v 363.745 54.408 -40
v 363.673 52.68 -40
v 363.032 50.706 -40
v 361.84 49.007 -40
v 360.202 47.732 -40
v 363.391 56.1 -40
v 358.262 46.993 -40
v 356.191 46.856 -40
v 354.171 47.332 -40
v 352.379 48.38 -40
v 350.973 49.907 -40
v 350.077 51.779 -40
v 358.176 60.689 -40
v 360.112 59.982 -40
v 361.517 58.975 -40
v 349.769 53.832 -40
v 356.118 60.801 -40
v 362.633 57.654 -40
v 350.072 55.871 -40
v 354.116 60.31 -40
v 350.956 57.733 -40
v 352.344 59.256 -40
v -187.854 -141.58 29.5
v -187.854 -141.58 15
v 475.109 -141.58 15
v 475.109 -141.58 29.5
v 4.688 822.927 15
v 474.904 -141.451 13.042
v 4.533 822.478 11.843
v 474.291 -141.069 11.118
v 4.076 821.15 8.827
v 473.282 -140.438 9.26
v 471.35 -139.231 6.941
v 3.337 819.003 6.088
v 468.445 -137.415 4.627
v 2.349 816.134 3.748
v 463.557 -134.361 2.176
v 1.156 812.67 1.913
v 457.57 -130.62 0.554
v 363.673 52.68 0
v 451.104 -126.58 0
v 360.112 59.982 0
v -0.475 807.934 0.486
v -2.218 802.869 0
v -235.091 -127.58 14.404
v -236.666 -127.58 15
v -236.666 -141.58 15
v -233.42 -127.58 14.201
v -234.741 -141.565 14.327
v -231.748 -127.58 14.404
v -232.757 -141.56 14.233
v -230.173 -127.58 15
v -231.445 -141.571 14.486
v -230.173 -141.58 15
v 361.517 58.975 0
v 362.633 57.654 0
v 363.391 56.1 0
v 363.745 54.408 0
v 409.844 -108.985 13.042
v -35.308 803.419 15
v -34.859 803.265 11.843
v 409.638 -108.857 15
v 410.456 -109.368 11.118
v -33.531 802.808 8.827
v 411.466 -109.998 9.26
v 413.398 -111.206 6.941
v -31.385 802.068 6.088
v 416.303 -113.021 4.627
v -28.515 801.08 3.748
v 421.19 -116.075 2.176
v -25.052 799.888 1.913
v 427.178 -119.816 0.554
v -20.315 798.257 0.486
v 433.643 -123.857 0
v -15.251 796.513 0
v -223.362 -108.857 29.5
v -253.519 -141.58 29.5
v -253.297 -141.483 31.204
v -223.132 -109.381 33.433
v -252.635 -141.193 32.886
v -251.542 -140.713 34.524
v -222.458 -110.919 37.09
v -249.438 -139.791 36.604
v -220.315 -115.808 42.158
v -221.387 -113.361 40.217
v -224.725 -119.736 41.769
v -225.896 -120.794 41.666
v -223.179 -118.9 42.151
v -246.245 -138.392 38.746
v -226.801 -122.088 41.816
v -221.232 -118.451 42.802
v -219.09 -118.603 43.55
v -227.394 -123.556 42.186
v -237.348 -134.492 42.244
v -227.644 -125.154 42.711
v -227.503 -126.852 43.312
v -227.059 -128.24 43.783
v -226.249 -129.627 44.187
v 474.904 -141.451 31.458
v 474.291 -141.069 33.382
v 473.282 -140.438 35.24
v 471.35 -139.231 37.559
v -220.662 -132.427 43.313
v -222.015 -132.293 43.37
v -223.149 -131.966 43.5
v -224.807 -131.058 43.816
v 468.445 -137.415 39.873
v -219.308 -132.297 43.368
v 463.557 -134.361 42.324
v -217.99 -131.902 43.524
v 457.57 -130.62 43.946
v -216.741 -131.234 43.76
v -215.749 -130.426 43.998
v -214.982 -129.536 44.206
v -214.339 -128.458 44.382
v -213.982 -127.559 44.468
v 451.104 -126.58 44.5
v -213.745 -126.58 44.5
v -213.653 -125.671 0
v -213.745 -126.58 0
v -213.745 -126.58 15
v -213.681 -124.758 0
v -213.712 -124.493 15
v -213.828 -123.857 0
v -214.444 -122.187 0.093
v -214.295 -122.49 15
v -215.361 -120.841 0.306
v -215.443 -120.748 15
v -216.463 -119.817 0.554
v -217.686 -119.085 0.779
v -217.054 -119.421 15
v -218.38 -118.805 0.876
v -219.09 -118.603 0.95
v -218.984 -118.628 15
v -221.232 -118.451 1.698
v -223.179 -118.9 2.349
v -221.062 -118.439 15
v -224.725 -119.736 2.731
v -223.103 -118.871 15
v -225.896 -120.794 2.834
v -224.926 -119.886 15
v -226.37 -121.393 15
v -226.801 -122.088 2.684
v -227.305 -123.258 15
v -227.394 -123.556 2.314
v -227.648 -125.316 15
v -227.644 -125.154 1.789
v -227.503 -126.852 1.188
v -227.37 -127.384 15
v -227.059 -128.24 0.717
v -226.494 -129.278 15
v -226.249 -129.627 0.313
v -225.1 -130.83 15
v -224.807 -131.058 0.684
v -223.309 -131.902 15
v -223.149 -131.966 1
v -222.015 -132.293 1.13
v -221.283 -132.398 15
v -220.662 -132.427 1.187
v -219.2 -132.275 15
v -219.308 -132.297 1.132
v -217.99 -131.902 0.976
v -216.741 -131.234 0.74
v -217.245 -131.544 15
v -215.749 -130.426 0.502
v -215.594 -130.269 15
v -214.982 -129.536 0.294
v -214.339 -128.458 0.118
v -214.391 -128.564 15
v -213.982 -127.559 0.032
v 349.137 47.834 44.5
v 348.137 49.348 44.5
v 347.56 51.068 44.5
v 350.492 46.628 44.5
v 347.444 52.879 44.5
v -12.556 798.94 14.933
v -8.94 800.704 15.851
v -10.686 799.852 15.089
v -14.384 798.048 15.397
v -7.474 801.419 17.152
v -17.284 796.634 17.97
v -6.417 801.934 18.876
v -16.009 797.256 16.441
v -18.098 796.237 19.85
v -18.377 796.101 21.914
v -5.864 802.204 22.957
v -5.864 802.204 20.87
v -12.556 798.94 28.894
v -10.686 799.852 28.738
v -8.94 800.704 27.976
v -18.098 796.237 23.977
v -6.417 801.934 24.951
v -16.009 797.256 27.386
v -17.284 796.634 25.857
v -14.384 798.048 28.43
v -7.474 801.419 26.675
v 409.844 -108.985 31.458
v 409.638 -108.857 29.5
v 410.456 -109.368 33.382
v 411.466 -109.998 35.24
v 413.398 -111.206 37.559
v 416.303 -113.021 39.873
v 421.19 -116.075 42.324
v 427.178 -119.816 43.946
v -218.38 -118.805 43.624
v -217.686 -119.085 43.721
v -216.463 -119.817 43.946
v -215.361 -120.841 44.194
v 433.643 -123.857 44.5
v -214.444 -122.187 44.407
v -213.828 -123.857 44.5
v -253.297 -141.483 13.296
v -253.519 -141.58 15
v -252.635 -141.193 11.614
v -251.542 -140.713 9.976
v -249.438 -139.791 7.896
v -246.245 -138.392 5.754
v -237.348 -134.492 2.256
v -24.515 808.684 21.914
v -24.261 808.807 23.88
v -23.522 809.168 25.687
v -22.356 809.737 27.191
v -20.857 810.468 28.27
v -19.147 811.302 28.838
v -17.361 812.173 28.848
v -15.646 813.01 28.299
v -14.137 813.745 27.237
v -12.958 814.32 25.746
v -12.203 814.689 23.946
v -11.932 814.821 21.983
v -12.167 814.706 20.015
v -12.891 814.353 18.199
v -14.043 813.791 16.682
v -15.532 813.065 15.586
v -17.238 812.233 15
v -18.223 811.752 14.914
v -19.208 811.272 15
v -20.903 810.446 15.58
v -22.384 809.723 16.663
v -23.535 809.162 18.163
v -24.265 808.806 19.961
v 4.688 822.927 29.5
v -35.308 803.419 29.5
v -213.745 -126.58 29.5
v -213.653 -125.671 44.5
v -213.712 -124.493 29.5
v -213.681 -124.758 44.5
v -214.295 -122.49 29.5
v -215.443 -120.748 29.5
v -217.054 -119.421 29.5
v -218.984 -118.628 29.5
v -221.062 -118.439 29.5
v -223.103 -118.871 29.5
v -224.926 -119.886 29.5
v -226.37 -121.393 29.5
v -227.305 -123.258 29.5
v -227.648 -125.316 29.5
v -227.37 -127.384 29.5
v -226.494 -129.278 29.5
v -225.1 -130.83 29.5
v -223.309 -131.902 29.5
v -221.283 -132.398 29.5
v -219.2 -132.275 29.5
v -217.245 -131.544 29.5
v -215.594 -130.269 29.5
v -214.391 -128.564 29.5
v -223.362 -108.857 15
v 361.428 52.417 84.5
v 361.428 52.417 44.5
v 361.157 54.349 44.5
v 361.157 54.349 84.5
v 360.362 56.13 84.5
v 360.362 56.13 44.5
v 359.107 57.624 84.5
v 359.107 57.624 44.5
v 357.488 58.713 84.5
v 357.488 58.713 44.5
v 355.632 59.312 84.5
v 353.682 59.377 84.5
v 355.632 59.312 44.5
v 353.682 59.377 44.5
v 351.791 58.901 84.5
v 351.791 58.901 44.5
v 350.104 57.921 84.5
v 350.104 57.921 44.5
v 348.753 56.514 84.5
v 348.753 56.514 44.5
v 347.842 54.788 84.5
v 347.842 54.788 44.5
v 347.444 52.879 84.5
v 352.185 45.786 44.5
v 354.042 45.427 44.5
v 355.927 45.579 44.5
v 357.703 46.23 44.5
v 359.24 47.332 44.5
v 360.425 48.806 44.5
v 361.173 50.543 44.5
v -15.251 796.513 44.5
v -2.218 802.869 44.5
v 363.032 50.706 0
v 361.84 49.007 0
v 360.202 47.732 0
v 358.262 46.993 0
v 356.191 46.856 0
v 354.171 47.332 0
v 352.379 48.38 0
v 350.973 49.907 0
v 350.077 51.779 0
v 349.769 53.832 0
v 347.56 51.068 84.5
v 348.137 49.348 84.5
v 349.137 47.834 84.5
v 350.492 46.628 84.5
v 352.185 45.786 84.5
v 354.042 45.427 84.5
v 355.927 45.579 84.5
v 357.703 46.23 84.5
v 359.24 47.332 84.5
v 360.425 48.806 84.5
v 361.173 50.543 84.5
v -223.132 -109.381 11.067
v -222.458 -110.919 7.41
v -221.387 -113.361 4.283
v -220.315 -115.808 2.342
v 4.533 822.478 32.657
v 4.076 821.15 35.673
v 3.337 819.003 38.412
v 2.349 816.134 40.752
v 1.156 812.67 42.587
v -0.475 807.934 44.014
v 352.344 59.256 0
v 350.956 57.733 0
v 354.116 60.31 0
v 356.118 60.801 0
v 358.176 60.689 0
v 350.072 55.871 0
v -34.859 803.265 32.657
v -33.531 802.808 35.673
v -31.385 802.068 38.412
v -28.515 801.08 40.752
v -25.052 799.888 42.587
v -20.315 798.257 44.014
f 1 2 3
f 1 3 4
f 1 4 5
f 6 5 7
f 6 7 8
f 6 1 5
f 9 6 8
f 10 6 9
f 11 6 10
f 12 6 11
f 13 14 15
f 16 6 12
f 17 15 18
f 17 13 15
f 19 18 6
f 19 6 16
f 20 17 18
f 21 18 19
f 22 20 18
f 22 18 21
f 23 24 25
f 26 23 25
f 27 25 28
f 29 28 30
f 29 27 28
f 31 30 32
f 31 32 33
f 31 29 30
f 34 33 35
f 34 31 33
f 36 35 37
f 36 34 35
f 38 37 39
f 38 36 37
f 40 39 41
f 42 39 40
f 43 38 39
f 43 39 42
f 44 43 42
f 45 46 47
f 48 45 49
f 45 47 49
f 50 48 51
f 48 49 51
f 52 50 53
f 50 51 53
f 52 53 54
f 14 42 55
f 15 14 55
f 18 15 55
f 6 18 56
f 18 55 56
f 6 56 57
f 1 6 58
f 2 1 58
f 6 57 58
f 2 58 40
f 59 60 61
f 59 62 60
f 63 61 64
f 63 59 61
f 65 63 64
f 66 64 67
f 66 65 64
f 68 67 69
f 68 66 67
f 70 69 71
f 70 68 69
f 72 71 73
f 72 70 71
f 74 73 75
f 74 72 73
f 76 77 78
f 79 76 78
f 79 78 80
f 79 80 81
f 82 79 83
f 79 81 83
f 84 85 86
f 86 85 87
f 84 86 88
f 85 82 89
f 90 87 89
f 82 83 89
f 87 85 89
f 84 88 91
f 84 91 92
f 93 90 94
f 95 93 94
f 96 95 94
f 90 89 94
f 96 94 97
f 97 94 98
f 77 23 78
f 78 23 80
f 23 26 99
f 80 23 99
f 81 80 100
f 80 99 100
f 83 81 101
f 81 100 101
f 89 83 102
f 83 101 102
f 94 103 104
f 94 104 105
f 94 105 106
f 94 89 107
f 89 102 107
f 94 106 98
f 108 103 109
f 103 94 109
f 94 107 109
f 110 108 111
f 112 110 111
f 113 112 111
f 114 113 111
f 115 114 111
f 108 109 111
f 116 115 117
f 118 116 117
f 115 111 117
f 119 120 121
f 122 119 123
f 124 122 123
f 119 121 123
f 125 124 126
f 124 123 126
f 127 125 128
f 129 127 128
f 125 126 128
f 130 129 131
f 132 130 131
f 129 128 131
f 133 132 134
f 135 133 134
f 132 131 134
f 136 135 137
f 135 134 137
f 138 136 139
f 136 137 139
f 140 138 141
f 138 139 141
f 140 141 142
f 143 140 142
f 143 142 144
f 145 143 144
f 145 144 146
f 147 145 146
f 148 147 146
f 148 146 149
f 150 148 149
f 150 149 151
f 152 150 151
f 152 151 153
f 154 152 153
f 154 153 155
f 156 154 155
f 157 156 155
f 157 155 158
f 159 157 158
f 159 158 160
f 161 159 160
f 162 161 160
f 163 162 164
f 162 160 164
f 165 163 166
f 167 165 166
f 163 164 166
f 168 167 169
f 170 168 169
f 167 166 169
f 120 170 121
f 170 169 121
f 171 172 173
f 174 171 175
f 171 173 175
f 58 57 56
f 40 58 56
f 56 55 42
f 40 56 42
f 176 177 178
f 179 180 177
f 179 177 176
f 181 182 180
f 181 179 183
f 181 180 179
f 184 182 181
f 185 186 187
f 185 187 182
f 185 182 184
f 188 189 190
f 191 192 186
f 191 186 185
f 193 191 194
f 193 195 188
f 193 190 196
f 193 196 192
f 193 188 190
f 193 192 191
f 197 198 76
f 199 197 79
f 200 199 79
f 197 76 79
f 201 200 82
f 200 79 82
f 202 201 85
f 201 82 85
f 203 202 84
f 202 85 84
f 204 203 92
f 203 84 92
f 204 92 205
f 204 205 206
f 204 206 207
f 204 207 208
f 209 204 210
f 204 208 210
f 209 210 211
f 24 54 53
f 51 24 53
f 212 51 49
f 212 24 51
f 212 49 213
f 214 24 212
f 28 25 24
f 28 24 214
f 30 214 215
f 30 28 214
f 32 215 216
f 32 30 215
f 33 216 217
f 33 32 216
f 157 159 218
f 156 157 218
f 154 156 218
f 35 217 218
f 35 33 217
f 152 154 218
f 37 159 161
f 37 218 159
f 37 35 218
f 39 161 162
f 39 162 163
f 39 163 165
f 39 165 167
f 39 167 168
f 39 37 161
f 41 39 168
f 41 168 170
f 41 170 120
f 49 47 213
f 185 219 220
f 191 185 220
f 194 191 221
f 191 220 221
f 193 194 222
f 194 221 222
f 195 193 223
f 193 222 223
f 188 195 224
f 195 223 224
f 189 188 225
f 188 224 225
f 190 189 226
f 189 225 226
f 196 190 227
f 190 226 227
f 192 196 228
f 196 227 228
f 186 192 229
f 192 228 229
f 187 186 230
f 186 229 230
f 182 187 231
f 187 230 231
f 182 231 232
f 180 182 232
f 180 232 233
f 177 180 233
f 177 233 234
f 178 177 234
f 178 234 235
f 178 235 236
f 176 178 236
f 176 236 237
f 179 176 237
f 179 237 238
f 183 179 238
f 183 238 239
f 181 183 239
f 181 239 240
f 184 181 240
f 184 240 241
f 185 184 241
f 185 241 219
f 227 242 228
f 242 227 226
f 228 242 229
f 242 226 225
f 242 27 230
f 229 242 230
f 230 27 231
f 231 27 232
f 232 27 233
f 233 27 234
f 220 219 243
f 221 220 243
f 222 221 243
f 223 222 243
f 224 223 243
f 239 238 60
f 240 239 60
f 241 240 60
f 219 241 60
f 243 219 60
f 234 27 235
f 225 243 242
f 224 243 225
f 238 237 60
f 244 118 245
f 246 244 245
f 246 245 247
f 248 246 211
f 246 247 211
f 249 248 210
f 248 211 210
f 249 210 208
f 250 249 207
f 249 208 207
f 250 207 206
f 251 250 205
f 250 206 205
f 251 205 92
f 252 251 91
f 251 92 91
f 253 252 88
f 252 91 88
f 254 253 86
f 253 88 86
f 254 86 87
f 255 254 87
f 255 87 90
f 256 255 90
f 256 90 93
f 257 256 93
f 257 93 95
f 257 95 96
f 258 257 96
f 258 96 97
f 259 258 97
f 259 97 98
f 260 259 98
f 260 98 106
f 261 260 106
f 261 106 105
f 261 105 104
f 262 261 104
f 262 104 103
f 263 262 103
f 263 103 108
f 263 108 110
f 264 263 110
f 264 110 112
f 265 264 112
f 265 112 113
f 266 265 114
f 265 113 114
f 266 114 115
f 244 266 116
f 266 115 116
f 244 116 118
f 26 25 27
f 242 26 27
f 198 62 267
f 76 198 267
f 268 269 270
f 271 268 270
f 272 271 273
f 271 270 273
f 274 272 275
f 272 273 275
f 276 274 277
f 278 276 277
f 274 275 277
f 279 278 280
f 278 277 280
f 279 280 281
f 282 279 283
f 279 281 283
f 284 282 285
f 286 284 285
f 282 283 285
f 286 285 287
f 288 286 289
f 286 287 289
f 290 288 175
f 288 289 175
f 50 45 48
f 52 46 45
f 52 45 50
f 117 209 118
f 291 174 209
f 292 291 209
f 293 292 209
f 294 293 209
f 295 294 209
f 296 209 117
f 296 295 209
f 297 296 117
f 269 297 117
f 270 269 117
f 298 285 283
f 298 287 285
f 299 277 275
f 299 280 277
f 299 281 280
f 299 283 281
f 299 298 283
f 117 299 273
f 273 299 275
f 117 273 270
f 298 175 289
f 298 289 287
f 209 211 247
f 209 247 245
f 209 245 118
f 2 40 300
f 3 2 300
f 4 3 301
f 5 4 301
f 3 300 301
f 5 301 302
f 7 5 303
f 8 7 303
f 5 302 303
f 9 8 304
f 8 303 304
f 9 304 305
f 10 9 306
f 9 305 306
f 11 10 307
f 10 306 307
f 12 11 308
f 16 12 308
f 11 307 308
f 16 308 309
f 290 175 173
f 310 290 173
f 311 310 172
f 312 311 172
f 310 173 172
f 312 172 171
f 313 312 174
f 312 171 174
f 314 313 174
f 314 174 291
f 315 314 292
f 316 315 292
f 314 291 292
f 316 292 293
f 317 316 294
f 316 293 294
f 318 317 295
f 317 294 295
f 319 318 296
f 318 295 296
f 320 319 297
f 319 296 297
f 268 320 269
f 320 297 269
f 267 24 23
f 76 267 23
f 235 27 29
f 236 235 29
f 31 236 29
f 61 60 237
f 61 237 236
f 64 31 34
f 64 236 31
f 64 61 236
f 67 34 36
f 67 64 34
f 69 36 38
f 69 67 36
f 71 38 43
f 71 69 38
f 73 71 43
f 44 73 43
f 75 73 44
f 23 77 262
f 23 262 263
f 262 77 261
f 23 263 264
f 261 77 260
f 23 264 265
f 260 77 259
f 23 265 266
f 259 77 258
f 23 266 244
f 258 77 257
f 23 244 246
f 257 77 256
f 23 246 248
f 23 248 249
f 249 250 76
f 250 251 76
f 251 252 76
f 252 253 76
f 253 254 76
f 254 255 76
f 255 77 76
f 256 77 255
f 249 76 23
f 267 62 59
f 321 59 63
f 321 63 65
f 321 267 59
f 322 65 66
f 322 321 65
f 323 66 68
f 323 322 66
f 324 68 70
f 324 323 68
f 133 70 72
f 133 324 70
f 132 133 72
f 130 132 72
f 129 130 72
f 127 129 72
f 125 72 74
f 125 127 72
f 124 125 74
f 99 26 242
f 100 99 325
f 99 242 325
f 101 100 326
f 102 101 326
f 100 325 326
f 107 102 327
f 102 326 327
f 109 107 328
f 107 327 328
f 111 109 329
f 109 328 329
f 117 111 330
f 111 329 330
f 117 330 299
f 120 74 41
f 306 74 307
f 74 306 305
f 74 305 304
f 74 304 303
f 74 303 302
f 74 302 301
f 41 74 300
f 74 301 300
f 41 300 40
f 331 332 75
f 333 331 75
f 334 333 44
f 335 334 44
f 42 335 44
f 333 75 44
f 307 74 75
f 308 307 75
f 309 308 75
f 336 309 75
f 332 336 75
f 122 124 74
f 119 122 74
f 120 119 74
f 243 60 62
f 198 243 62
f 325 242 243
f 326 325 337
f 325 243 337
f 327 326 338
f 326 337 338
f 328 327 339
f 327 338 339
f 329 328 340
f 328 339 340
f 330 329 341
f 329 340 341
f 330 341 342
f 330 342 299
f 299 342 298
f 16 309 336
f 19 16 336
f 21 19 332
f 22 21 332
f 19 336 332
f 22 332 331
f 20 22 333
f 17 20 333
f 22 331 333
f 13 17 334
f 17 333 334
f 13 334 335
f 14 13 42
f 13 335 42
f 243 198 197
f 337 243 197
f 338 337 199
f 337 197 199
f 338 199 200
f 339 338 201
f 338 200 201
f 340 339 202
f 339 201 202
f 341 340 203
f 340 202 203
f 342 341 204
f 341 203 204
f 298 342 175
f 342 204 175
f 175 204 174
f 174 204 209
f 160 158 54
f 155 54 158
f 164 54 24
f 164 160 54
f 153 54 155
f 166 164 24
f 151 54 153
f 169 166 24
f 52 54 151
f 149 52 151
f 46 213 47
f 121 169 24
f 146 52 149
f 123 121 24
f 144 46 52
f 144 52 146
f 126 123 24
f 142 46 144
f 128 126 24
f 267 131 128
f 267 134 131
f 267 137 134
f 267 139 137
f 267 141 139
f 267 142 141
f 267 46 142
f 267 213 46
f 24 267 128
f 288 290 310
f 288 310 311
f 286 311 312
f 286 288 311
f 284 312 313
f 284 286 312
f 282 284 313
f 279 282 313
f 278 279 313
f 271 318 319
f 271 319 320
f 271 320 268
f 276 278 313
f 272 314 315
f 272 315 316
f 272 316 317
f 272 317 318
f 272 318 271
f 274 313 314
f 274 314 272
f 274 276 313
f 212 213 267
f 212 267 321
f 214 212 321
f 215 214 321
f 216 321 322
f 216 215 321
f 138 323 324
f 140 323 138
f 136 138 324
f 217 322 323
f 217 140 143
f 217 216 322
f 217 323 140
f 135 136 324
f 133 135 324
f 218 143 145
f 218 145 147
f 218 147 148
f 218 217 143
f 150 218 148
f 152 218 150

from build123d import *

# Parameters (mm, degrees)
BOSS_EXTRUDE1_DEPTH = 44.5
FILLET2_R           = 15
SKETCH2_R           = 7
CUT_EXTRUDE1_DEPTH  = 14
SKETCH3_R           = 7
CUT_EXTRUDE2_DEPTH  = 14
SKETCH4_R           = 7
CUT_EXTRUDE3_DEPTH  = 14
SKETCH5_R           = 7
CUT_EXTRUDE4_DEPTH  = 952.271625519
SKETCH6_W           = 14.5
SKETCH6_H           = 44.5
CUT_EXTRUDE5_DEPTH  = 936.632574619
BOSS_EXTRUDE3_DEPTH = 40
BOSS_EXTRUDE4_DEPTH = 40


with BuildPart() as part:
    # Sketch1 → Boss-Extrude1 (new body)
    with BuildSketch(Plane.XY):
        Polygon((-253.518736915, -141.579738071), (475.109189289, -141.579738071), (4.687860899, 822.926918688), (-35.308474161, 803.419402656), (409.63823983, -108.856554338), (-223.36176017, -108.856554338), align=None)
    extrude(amount=BOSS_EXTRUDE1_DEPTH)

    # Fillet2
    fillet2_edges = [part.edges().sort_by_distance(p)[0] for p in [
        (239.898525094, 340.673590309, 44.5),
        (-15.310306631, 813.173160672, 44.5),
        (187.164882834, 347.281424159, 44.5),
        (93.13823983, -108.856554338, 44.5),
        (-238.440248543, -125.218146204, 44.5),
        (93.13823983, -108.856554338, 0),
        (187.164882834, 347.281424159, 0),
        (-15.310306631, 813.173160672, 0),
        (239.898525094, 340.673590309, 0),
        (110.795226187, -141.579738071, 0),
        (-238.440248543, -125.218146204, 0),
        (110.795226187, -141.579738071, 44.5),
    ]]
    fillet(fillet2_edges, radius=FILLET2_R)

    # Sketch2 → Cut-Extrude1 (cut)
    with BuildSketch(Plane(origin=(-323.336767908, 662.938617367, 0), x_dir=(0.8987940462991654, 0.43837114678908073, 0), z_dir=(-0.43837114678908073, 0.8987940462991654, 0))):
        with Locations(Location((339.470196695, -21.913602874, 0), (0, 0, 180))):
            Circle(SKETCH2_R)
    extrude(amount=-CUT_EXTRUDE1_DEPTH, mode=Mode.SUBTRACT)

    # Sketch3 → Cut-Extrude2 (cut)
    with BuildSketch(Plane(origin=(-66.534083276, 61.316368798, 0), x_dir=(0, 0, 1), z_dir=(-0.735352443447444, 0.6776848706558778, 0))):
        with Locations(Location((22.366337019, -255.510068241, 0), (0, 0, 270))):
            Circle(SKETCH3_R)
    extrude(amount=-CUT_EXTRUDE2_DEPTH, mode=Mode.SUBTRACT)

    # Sketch4 → Cut-Extrude3 (cut)
    with BuildSketch(Plane(origin=(0, -141.579738071, 0), x_dir=(-1, 0, 0), z_dir=(0, -1, 0))):
        with Locations(Location((233.419507196, -21.201481555, 0), (0, 0, 117.634316404))):
            Circle(SKETCH4_R)
    extrude(amount=-CUT_EXTRUDE3_DEPTH, mode=Mode.SUBTRACT)

    # Sketch5 → Cut-Extrude4 (cut, through all)
    with BuildSketch(Plane.XY.offset(44.5)):
        with Locations(Location((-220.649115428, -125.427110978, 0), (0, 0, 350.522457382))):
            Circle(SKETCH5_R)
    extrude(amount=-CUT_EXTRUDE4_DEPTH, mode=Mode.SUBTRACT)

    # Sketch6 → Cut-Extrude5 (cut, through all)
    with BuildSketch(Plane(origin=(-66.534083276, 61.316368798, 0), x_dir=(0, 0, 1), z_dir=(-0.735352443447444, 0.6776848706558778, 0))):
        with Locations((22.25, -253.666818768)):
            Rectangle(SKETCH6_W, SKETCH6_H)
    extrude(amount=-CUT_EXTRUDE5_DEPTH, mode=Mode.SUBTRACT)

    # Sketch8 → Boss-Extrude3 (add)
    with BuildSketch(Plane.XY.offset(44.5)):
        with BuildLine():
            ThreePointArc((350.492241226, 46.628294304), (357.703100488, 46.229913436), (361.428471817, 52.416738718))
            ThreePointArc((361.428471817, 52.416738718), (354.659562876, 59.412923172), (347.443729839, 52.878668912))
            Line((347.443729839, 52.878668912), (350.492241226, 46.628294304))
        make_face()
        with BuildLine():
            Line((350.492241226, 46.628294304), (347.443729839, 52.878668912))
            ThreePointArc((347.443729839, 52.878668912), (348.136913493, 49.34814069), (350.492241226, 46.628294304))
        make_face()
    extrude(amount=BOSS_EXTRUDE3_DEPTH)

    # Sketch9 → Boss-Extrude4 (add)
    with BuildSketch(Plane(origin=(0, 0, 0), x_dir=(-1, 0, 0), z_dir=(0, 0, -1))):
        with BuildLine():
            ThreePointArc((-363.673348609, 52.680013675), (-356.190881193, 46.855723683), (-349.768761726, 53.831829624))
            ThreePointArc((-349.768761726, 53.831829624), (-353.191242582, 59.848585957), (-360.112006519, 59.981847043))
            Line((-360.112006519, 59.981847043), (-363.673348609, 52.680013675))
        make_face()
        with BuildLine():
            Line((-363.673348609, 52.680013675), (-360.112006519, 59.981847043))
            ThreePointArc((-360.112006519, 59.981847043), (-363.06032005, 56.900427651), (-363.673348609, 52.680013675))
        make_face()
    extrude(amount=BOSS_EXTRUDE4_DEPTH)


solid = part.part
